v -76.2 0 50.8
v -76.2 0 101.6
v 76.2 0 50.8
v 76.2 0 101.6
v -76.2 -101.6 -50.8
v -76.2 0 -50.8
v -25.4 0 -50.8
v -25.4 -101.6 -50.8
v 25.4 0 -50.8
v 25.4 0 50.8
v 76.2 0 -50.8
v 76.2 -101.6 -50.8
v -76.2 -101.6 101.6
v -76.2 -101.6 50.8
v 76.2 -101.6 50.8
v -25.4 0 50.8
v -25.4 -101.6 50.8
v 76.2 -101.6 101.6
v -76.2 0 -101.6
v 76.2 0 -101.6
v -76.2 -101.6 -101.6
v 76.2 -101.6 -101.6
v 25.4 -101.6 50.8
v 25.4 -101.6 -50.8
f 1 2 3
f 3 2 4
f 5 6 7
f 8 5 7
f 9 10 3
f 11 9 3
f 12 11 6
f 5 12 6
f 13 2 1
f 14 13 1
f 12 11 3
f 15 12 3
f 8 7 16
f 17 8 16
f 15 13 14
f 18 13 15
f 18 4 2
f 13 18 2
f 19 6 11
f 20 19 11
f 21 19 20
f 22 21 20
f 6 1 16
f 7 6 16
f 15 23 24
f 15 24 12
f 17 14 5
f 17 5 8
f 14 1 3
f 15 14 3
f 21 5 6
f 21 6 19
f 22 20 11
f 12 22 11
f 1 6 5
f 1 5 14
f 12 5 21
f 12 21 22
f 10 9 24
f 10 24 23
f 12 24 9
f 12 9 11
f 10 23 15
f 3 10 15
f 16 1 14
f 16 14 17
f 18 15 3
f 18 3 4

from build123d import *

# Parameters (mm, degrees)
F0_W     = 50.8
F0_H     = 101.6
F1_DEPTH = 101.6
F2_DEPTH = 101.6
F3_DEPTH = 101.6


# Not quite as in the source:
# - ends of sketch curves that miss each other by under 0.0002 mm in the source are joined


with BuildPart() as f1:
    # F0 (on Front) → F1 (new body)
    with BuildSketch(Plane.XZ):
        with Locations((50.8, 0)):
            Rectangle(F0_W, F0_H)
    extrude(amount=F1_DEPTH)


with BuildPart() as f1b:
    # F0 (on Front) → F1, piece 2 (new body)
    with BuildSketch(Plane.XZ):
        with Locations((-50.8, 0)):
            Rectangle(F0_W, F0_H)
    extrude(amount=F1_DEPTH)


with BuildPart() as f2:
    # F0 (on Front) → F2 (new body)
    with BuildSketch(Plane.XZ):
        Polygon((-76.2, 50.8), (-25.4, 50.8), (25.4, 50.8), (76.2, 50.8), (76.2000009418, 101.6), (-76.2, 101.6), align=None)
    extrude(amount=F2_DEPTH)


with BuildPart() as f3:
    # F0 (on Front) → F3 (new body)
    with BuildSketch(Plane.XZ):
        Polygon((25.4, -50.8), (-25.4, -50.8), (-76.2, -50.8), (-76.2, -101.6), (76.2, -101.6), (76.2, -50.8), align=None)
    extrude(amount=F3_DEPTH)


solid = Compound([f1.part, f1b.part, f2.part, f3.part])
